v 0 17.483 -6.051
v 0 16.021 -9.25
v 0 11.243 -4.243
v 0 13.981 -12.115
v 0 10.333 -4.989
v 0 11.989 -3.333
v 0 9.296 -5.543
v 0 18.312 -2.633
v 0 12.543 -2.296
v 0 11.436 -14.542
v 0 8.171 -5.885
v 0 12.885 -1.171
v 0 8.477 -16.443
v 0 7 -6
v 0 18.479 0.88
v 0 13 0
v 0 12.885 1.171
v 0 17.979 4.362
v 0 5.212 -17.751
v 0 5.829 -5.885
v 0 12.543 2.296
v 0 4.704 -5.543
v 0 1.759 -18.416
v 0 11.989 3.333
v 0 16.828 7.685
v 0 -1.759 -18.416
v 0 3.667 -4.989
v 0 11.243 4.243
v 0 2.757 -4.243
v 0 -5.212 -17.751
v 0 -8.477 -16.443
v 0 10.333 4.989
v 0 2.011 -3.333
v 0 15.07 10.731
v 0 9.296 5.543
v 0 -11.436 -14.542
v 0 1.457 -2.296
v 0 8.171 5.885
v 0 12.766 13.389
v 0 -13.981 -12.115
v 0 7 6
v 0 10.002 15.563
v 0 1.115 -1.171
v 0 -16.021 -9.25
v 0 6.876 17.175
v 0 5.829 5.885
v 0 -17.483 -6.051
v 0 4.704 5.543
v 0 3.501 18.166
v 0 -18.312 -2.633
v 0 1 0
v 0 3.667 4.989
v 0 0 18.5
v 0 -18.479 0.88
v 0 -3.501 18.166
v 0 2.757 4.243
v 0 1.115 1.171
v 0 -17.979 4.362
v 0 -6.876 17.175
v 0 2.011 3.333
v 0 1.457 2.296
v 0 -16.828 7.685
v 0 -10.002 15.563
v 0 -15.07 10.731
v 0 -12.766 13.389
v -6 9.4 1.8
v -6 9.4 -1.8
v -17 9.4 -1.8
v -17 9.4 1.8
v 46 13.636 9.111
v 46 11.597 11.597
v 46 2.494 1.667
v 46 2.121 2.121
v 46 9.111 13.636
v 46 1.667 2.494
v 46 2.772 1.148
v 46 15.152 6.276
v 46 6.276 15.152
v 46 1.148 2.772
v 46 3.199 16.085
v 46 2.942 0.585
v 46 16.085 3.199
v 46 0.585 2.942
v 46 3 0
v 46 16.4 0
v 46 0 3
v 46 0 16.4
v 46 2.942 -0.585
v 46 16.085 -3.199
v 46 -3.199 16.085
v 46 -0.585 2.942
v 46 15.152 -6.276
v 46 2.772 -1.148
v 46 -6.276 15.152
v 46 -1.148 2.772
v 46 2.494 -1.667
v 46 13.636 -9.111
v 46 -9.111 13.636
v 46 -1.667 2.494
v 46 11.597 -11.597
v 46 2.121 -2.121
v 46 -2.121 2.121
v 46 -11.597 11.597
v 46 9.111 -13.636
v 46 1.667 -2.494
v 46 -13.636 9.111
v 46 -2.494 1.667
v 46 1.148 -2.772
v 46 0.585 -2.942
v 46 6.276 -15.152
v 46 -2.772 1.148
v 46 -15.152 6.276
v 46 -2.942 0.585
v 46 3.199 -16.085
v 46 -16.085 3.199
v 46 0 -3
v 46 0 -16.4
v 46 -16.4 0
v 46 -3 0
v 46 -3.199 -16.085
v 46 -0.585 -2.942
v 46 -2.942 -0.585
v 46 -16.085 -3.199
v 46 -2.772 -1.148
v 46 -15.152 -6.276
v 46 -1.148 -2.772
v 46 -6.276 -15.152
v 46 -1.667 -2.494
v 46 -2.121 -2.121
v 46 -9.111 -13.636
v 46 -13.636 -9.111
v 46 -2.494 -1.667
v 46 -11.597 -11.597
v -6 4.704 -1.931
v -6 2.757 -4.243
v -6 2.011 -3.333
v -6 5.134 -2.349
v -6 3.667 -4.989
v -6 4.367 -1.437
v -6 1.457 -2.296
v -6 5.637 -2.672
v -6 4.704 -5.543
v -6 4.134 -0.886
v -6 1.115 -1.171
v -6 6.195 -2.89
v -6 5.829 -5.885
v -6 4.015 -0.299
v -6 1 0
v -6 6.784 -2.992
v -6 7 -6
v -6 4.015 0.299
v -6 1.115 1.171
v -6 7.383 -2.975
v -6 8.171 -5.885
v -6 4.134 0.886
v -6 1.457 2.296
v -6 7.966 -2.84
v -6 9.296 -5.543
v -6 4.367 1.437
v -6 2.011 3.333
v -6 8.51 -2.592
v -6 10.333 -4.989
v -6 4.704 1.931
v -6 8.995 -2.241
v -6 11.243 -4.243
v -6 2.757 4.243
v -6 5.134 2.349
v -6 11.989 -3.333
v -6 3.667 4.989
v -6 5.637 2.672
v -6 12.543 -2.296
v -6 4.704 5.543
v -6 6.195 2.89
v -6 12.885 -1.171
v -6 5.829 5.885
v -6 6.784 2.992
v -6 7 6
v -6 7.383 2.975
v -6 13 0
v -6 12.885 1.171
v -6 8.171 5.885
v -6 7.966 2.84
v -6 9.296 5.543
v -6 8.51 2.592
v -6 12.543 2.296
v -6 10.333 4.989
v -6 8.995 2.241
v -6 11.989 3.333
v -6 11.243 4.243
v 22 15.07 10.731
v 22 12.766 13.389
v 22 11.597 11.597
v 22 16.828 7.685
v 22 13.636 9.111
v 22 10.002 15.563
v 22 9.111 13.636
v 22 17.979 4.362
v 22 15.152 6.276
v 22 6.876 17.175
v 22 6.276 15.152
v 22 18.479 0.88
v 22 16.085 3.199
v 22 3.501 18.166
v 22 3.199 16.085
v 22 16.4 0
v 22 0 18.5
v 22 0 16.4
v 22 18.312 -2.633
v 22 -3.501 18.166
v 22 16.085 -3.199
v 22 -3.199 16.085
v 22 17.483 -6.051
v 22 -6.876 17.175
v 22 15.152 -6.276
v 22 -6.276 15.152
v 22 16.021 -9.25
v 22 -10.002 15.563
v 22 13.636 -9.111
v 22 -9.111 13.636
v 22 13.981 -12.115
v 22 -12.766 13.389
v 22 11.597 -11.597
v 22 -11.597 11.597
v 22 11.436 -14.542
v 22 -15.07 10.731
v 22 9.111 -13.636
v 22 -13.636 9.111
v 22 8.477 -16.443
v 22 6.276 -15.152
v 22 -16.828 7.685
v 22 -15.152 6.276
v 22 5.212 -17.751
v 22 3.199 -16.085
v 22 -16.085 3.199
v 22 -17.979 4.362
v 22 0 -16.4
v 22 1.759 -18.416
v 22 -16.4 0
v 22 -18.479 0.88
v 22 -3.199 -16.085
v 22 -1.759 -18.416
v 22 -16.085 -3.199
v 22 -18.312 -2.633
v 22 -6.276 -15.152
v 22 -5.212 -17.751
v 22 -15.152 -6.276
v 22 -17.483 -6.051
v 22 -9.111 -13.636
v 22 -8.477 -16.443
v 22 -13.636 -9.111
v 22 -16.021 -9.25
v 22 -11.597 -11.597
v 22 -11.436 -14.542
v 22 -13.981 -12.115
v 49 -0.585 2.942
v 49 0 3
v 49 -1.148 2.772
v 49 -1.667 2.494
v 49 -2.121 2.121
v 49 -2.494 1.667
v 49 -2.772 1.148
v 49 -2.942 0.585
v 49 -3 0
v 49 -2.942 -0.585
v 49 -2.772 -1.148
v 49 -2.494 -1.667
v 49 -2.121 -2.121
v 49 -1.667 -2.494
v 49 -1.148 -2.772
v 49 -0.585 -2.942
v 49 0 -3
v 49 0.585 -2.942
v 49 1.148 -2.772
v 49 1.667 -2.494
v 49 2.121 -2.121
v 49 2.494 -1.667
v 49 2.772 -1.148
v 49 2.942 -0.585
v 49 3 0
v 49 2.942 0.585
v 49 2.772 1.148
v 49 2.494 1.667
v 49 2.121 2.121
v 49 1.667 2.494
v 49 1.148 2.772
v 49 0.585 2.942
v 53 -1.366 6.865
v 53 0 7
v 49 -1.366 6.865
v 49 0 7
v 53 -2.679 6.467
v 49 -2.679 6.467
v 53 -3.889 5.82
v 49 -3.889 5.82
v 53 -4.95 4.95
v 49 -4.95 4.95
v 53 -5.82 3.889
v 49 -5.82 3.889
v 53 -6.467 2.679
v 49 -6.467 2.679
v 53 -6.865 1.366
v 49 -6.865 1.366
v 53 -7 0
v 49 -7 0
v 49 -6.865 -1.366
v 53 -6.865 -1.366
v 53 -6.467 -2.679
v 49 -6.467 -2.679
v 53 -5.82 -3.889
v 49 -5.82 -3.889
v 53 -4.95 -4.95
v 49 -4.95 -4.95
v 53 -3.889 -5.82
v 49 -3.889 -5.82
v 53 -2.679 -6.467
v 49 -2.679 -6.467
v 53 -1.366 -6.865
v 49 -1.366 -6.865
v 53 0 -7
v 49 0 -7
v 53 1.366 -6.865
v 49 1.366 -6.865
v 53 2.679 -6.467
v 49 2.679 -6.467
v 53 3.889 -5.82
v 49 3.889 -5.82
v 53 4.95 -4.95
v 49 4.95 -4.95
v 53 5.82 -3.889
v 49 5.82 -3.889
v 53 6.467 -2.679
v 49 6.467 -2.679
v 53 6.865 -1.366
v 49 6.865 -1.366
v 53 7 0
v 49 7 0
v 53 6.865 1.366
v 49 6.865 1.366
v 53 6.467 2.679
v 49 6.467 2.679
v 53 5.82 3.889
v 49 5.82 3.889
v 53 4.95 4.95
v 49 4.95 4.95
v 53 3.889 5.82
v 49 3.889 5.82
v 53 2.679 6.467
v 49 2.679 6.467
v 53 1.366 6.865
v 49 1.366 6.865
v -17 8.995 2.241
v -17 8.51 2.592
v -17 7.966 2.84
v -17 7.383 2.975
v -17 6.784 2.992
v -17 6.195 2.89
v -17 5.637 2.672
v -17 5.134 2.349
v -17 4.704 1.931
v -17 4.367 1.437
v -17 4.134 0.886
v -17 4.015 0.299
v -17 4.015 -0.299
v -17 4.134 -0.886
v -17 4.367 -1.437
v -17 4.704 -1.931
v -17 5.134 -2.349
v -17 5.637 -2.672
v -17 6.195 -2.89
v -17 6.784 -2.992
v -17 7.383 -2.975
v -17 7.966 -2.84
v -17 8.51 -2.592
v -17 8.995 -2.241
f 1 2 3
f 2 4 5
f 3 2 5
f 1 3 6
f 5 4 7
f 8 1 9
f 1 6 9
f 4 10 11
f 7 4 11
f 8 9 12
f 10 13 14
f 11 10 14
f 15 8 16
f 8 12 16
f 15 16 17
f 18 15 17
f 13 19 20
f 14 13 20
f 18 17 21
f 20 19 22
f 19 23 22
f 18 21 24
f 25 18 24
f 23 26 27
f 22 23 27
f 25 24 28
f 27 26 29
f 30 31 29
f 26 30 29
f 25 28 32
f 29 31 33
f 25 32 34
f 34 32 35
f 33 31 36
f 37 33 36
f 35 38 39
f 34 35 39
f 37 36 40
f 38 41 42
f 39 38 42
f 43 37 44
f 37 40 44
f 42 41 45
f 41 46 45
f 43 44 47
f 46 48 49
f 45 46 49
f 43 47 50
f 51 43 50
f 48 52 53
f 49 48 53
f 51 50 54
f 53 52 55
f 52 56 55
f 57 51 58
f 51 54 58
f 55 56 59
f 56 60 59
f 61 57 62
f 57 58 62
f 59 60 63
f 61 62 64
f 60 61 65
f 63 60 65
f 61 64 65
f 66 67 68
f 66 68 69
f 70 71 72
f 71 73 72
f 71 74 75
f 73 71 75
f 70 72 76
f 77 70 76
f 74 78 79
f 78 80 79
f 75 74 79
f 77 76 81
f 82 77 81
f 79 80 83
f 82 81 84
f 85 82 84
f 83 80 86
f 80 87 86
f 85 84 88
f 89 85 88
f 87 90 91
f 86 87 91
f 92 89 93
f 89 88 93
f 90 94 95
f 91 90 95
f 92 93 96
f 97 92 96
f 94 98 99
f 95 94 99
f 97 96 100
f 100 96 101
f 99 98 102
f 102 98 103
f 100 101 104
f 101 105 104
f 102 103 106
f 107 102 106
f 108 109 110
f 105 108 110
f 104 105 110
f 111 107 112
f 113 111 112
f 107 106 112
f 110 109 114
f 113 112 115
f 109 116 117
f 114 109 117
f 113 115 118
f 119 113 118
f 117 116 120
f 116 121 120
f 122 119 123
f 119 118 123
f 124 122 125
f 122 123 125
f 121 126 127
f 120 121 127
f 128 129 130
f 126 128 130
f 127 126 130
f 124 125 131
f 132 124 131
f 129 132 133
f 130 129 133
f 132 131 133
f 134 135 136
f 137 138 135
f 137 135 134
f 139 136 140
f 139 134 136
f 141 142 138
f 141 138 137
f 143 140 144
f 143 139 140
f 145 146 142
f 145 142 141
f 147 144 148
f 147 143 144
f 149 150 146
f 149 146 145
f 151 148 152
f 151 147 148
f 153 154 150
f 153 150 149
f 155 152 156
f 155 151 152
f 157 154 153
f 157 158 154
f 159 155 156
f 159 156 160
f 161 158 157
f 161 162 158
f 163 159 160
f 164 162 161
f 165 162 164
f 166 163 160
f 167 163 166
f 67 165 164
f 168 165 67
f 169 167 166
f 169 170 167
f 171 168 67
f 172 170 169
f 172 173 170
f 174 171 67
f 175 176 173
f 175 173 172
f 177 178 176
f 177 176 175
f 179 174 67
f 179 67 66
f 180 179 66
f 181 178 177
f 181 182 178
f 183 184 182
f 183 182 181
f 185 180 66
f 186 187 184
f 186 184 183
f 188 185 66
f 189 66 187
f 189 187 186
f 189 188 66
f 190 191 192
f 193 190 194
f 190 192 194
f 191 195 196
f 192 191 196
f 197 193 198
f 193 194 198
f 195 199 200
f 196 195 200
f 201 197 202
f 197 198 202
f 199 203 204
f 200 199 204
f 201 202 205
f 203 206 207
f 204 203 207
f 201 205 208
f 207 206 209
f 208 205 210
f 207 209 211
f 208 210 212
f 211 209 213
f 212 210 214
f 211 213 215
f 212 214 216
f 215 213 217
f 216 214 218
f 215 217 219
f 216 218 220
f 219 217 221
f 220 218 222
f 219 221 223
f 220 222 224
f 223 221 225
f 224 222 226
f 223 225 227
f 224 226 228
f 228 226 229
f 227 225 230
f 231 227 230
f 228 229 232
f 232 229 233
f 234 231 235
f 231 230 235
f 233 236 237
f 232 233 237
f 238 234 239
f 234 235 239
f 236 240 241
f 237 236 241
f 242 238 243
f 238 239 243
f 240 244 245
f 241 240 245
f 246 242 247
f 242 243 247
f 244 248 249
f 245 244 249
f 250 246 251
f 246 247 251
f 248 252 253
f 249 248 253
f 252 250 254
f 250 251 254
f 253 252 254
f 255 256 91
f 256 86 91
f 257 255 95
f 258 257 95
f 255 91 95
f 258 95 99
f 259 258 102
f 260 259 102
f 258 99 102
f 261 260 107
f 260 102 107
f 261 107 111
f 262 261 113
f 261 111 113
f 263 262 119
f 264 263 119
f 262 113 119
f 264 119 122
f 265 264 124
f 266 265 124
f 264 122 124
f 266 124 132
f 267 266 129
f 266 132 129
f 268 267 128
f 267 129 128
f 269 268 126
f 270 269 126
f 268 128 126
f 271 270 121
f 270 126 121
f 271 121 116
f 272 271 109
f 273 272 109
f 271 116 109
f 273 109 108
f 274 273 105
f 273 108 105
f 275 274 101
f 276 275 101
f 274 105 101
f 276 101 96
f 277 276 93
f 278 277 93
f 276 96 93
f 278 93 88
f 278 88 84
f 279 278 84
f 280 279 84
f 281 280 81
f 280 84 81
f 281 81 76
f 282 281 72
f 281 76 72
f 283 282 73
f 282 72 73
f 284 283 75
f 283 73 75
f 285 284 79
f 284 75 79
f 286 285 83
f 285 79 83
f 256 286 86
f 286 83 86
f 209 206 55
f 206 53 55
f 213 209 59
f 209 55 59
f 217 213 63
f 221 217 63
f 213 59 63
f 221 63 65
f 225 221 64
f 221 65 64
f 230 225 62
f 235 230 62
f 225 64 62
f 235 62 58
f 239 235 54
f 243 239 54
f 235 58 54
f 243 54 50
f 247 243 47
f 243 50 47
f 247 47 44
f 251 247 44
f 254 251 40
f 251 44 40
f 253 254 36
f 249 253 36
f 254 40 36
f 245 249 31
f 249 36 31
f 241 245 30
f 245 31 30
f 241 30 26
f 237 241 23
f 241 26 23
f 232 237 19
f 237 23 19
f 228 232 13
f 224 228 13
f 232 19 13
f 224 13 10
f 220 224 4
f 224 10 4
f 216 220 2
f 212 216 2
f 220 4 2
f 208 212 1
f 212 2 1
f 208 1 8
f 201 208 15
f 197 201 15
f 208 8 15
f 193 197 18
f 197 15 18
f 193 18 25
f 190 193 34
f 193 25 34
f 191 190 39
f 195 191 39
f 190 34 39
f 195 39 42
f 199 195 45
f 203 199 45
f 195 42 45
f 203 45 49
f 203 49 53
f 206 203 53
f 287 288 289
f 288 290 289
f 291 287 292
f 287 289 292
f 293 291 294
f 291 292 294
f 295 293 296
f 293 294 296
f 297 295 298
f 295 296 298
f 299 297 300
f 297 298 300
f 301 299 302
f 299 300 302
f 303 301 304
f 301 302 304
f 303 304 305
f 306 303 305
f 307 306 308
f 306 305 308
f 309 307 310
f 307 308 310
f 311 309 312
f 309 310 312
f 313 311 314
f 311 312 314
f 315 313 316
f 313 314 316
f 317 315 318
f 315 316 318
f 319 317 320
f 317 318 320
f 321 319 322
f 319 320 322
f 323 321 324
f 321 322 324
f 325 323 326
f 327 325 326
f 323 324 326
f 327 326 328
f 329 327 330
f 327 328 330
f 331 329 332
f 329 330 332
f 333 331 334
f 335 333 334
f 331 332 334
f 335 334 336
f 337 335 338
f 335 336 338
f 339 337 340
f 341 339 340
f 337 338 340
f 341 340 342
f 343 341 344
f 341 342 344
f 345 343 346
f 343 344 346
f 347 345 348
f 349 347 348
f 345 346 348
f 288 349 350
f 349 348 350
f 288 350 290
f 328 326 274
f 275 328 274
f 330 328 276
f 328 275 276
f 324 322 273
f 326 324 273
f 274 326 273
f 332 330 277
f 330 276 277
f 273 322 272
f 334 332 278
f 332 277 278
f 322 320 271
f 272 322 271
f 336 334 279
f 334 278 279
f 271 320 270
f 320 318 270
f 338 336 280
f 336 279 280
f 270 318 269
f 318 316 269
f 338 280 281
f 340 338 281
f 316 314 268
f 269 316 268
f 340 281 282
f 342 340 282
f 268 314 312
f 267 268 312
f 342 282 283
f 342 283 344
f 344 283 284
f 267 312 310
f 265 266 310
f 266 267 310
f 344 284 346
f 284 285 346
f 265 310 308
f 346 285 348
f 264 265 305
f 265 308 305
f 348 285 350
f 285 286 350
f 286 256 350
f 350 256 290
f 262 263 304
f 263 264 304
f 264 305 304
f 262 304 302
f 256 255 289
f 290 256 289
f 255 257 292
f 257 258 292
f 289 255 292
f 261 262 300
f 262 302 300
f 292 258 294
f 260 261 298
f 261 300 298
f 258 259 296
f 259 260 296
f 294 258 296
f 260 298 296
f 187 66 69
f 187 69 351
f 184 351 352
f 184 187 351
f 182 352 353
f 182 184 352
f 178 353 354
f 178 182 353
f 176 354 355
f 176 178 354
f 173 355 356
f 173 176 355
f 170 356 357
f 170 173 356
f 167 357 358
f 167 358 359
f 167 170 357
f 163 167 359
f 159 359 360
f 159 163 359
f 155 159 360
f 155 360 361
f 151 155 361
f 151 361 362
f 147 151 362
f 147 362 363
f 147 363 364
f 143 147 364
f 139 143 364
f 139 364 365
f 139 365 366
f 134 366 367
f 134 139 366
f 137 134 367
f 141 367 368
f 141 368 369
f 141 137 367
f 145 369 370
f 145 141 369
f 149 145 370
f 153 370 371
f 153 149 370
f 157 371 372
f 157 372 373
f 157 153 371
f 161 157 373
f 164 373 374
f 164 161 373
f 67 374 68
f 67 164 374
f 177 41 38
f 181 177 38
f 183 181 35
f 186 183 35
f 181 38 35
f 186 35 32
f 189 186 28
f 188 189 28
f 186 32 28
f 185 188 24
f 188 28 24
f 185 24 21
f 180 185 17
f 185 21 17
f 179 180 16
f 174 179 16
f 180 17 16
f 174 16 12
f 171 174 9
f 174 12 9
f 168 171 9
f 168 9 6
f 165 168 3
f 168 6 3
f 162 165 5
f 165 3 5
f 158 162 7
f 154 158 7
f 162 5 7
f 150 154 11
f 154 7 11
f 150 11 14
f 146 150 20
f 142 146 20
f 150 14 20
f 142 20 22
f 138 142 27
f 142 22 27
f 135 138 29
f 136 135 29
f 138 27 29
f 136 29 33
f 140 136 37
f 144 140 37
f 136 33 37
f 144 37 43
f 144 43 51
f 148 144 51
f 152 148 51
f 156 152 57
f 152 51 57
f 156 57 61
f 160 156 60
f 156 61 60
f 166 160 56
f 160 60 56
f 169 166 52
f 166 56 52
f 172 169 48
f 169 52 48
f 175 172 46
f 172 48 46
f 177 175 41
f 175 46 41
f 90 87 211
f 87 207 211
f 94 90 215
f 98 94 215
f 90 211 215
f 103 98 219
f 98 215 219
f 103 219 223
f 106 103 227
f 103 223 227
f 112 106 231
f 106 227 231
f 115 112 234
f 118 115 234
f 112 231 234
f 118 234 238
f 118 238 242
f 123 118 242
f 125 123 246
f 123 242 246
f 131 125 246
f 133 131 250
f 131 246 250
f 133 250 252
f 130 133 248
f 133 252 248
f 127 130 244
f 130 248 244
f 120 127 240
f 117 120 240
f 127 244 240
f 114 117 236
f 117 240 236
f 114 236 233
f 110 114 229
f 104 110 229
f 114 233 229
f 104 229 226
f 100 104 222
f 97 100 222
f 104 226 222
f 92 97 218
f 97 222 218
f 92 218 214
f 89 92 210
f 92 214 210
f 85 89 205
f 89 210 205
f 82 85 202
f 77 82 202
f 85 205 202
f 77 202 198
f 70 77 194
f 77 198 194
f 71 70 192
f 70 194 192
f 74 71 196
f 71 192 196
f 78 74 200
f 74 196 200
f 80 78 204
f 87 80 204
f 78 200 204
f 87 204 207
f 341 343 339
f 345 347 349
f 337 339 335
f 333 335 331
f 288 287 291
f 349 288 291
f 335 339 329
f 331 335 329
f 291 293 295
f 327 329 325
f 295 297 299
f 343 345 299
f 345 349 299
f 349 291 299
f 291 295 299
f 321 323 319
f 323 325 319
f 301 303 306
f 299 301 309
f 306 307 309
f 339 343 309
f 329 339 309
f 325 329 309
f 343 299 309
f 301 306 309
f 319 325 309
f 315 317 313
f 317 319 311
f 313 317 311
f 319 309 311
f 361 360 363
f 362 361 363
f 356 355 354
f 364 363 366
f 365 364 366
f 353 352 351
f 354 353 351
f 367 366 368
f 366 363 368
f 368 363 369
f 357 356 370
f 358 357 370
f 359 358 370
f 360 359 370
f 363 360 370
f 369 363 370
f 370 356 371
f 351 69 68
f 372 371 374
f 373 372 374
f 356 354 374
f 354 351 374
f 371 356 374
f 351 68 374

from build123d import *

# Parameters (mm, degrees)
SKETCH_2_R      = 6
EXTRUDE_1_DEPTH = 6
EXTRUDE_2_DEPTH = 11


with BuildPart() as part:
    # 草图1 → 旋转1 (revolve)
    with BuildSketch(Plane(origin=(0, 0, 0), x_dir=(1, 0, 0), z_dir=(0, 1, 0)), mode=Mode.PRIVATE) as revolve_1_sk:
        Polygon((0, 18.5), (0, 0), (53, 0), (53, 7), (49, 7), (49, 3), (46, 3), (46, 16.4), (22, 16.4), (22, 18.5), align=None)
    revolve(revolve_1_sk.sketch.rotate(Axis((0, 0, 0), (1, 0, 0)), 180), axis=Axis((0, 0, 0), (1, 0, 0)))

    # 草图2 → 凸台-拉伸1 (add)
    with BuildSketch(Plane.ZY):
        with Locations((0, 7)):
            Circle(SKETCH_2_R)
    extrude(amount=EXTRUDE_1_DEPTH)

    # 草图3 → 凸台-拉伸2 (add)
    with BuildSketch(Plane.ZY.offset(6)):
        with BuildLine():
            Line((-1.8, 9.4), (1.8, 9.4))
            ThreePointArc((1.8, 9.4), (0, 4), (-1.8, 9.4))
        make_face()
    extrude(amount=EXTRUDE_2_DEPTH)


solid = part.part
